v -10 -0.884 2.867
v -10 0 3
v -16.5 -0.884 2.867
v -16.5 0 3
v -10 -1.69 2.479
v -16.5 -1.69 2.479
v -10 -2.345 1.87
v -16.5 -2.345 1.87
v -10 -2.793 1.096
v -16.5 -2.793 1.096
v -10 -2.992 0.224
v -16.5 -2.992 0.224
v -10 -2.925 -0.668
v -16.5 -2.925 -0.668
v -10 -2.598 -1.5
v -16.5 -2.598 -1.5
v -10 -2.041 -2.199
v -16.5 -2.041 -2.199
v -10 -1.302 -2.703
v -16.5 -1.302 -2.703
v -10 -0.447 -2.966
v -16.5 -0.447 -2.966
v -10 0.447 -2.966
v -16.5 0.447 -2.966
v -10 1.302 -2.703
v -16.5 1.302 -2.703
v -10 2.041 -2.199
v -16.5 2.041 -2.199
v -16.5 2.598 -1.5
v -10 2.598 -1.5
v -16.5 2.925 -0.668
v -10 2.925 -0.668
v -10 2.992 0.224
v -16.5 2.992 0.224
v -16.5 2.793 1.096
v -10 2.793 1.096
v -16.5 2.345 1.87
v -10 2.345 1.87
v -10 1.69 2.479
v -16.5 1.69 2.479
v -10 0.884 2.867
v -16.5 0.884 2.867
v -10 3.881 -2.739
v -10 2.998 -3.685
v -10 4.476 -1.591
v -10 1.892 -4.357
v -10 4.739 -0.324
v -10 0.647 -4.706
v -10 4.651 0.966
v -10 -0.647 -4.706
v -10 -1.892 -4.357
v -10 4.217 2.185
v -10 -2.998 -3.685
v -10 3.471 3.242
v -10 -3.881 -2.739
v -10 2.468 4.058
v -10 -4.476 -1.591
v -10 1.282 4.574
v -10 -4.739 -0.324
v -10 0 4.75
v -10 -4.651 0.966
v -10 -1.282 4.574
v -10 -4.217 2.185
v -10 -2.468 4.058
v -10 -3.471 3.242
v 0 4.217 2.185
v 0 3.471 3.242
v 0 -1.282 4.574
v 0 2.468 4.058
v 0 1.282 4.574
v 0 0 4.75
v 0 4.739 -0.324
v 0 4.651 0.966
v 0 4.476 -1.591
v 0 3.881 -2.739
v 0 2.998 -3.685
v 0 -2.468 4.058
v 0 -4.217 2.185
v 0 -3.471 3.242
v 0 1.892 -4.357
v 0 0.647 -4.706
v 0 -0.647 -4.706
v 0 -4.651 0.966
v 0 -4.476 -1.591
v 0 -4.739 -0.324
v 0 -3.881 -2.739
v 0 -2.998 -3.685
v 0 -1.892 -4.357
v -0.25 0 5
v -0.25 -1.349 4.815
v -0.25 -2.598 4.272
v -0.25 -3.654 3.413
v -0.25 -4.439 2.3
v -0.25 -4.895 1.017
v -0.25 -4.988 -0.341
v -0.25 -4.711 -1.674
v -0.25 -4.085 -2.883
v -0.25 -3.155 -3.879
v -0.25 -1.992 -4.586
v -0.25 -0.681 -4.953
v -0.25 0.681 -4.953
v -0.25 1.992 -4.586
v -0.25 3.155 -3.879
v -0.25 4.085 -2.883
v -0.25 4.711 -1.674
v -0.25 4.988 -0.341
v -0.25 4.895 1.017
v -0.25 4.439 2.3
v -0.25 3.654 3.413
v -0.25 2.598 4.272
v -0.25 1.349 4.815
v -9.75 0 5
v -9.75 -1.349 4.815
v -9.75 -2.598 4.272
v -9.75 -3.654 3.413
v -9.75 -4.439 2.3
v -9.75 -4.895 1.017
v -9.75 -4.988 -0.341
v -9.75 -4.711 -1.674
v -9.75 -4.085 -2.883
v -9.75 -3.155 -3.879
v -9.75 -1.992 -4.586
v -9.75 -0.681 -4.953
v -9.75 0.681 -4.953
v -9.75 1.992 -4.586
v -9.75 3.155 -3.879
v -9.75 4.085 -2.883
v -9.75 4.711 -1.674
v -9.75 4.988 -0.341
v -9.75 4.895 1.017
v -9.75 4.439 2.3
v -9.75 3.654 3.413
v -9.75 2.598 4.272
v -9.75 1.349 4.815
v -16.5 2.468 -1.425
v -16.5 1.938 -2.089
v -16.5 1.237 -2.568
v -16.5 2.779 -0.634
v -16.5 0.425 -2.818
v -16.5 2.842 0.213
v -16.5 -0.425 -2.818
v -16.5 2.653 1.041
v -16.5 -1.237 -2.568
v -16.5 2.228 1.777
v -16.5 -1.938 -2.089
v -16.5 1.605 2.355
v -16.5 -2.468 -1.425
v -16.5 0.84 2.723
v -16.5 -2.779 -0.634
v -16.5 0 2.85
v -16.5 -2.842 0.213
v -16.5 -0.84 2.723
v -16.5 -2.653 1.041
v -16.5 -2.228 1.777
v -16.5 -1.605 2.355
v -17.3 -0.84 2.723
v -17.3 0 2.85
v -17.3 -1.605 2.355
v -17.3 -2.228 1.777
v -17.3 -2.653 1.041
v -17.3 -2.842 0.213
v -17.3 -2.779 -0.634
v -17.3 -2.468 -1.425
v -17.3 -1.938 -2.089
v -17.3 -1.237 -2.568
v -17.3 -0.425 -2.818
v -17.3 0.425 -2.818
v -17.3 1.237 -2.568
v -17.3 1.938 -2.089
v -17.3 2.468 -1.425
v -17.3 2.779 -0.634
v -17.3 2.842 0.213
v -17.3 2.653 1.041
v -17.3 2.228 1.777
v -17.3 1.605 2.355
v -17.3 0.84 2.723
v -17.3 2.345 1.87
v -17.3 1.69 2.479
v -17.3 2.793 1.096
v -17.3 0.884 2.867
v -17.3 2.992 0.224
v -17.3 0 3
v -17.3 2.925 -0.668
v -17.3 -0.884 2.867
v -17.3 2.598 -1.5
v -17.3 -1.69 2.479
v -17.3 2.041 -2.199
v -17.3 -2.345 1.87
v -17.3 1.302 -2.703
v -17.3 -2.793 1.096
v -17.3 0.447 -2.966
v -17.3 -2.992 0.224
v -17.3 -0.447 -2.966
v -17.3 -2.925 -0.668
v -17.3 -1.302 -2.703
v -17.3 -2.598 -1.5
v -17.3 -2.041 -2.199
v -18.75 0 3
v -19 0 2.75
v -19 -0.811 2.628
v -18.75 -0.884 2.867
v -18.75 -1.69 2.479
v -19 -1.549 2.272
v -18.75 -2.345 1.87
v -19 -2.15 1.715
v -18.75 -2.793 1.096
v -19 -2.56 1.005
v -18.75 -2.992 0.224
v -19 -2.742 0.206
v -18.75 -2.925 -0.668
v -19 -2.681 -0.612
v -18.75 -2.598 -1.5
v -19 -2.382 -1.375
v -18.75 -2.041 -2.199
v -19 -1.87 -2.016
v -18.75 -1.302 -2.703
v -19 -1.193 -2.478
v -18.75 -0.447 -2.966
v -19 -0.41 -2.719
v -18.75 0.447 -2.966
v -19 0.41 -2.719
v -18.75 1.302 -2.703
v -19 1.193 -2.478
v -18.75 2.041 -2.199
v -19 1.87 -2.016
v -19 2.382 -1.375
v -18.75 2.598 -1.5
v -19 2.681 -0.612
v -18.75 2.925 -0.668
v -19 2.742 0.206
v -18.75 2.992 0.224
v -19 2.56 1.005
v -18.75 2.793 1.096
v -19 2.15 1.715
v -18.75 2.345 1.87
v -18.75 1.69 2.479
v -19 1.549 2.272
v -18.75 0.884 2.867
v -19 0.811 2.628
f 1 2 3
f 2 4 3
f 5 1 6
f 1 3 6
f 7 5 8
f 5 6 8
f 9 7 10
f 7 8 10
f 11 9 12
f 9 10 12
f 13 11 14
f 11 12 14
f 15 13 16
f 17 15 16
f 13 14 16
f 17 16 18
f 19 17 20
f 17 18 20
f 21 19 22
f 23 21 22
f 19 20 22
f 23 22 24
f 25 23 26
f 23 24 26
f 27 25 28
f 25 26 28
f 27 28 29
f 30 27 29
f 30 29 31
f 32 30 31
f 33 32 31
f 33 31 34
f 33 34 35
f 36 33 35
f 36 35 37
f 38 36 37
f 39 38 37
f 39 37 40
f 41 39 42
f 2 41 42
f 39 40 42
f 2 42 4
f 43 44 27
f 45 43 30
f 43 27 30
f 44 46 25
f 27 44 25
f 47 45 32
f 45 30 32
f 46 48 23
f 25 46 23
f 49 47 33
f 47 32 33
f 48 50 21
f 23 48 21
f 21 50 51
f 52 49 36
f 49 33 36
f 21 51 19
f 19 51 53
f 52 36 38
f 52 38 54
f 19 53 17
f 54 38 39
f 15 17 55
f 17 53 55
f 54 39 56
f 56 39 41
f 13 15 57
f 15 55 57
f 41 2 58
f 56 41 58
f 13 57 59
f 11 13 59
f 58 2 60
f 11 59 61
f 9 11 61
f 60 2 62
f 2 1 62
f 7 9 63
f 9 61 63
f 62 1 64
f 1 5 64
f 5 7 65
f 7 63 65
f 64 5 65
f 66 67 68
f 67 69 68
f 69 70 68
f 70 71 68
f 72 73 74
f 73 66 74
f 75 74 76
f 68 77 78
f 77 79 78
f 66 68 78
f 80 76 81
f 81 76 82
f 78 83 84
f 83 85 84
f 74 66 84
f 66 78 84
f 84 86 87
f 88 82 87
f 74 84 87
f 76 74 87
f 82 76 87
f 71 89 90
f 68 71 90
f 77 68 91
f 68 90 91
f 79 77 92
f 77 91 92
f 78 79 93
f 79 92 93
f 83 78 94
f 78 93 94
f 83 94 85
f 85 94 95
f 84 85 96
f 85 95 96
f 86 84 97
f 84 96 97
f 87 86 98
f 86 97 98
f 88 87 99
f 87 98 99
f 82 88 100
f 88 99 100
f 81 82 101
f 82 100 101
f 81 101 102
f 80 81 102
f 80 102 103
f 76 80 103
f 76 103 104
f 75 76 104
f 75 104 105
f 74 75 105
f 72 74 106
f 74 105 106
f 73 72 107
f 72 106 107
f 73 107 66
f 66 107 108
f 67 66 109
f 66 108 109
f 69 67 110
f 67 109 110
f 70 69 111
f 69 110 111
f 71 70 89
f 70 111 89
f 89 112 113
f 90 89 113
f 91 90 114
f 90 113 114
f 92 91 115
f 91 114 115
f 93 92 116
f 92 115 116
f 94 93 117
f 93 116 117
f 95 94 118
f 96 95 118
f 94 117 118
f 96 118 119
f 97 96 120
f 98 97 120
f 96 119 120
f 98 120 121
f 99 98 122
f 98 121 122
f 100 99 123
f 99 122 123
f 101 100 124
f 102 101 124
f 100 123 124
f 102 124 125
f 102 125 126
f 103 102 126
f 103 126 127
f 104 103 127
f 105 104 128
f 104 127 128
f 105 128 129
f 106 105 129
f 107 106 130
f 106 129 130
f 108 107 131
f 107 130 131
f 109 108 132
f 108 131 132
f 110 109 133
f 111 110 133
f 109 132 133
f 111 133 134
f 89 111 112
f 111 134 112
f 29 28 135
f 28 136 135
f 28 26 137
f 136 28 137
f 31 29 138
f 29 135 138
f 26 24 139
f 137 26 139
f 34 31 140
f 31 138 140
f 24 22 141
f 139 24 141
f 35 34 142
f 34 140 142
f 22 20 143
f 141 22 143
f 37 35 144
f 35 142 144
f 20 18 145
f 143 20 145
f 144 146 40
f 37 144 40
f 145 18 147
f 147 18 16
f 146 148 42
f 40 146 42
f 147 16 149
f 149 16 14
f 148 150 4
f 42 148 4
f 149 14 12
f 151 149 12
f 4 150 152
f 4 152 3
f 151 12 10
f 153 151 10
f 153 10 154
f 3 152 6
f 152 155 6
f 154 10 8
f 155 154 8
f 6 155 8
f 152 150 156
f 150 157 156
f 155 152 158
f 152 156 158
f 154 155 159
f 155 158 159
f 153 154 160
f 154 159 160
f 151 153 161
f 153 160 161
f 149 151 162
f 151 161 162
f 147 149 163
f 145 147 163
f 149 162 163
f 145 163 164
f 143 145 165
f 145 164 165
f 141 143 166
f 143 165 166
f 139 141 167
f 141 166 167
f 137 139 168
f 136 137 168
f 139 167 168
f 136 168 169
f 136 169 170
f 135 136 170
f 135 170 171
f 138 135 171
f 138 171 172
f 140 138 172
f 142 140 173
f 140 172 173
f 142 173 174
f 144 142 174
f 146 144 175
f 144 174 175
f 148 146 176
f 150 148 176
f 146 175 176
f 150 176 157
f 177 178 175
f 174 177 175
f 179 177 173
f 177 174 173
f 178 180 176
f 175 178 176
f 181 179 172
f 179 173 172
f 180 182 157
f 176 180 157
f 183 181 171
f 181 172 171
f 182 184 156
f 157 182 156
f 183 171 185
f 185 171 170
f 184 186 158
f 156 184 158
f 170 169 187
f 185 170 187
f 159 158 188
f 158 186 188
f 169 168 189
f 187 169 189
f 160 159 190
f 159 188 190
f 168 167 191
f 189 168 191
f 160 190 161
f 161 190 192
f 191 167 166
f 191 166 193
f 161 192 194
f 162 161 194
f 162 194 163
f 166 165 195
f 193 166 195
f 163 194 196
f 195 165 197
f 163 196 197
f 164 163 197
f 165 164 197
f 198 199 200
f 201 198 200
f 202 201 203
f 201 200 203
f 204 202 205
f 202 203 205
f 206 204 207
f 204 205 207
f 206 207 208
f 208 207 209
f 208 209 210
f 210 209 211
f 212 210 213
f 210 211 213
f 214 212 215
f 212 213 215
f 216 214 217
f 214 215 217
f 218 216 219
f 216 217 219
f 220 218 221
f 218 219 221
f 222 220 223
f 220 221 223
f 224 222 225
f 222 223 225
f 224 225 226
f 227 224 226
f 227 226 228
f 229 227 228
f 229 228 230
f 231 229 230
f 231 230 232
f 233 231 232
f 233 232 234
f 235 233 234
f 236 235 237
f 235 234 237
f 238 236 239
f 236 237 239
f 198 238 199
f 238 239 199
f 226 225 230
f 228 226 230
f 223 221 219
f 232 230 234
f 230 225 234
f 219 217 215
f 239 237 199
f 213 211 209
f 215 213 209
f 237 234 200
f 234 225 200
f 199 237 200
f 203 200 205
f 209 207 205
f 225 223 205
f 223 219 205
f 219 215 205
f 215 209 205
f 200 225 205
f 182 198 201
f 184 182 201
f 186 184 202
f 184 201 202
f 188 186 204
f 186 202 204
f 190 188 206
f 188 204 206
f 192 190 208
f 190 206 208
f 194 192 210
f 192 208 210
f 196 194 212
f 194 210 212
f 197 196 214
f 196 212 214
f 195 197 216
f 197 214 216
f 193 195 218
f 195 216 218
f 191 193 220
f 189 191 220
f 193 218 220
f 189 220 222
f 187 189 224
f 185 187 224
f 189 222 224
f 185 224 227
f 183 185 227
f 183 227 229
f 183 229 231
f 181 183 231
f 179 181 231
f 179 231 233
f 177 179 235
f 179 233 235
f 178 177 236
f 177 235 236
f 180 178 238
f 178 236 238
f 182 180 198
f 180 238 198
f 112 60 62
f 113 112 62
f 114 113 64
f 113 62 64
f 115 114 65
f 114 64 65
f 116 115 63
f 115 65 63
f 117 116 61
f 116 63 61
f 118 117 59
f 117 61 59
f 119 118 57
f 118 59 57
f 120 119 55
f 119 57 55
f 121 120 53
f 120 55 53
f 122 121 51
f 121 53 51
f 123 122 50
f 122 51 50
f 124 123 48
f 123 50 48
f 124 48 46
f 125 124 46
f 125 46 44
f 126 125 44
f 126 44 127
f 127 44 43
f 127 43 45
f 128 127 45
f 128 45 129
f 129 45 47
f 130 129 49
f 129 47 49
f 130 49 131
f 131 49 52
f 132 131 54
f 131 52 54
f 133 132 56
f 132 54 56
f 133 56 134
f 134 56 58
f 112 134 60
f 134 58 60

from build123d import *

# Parameters (mm, degrees)
F2_SIZE = 0.25


with BuildPart() as f1:
    # F0 (on Front) → F1 (revolve)
    with BuildSketch(Plane.XZ):
        Polygon((-19, 0), (0, 0), (0, 5), (-10, 5), (-10, 3), (-16.5, 3), (-16.5, 2.85), (-17.3, 2.85), (-17.3, 3), (-19, 3), align=None)
    revolve(axis=Axis((6.458773, 0, 0), (1, 0, 0)))

    # F2
    f2_edges = [f1.edges().sort_by_distance(p)[0] for p in [
        (0, 0, -5),
        (-10, 0, -5),
        (-5, 0, 5),
        (-19, 0, -3),
    ]]
    chamfer(f2_edges, length=F2_SIZE)


solid = f1.part
